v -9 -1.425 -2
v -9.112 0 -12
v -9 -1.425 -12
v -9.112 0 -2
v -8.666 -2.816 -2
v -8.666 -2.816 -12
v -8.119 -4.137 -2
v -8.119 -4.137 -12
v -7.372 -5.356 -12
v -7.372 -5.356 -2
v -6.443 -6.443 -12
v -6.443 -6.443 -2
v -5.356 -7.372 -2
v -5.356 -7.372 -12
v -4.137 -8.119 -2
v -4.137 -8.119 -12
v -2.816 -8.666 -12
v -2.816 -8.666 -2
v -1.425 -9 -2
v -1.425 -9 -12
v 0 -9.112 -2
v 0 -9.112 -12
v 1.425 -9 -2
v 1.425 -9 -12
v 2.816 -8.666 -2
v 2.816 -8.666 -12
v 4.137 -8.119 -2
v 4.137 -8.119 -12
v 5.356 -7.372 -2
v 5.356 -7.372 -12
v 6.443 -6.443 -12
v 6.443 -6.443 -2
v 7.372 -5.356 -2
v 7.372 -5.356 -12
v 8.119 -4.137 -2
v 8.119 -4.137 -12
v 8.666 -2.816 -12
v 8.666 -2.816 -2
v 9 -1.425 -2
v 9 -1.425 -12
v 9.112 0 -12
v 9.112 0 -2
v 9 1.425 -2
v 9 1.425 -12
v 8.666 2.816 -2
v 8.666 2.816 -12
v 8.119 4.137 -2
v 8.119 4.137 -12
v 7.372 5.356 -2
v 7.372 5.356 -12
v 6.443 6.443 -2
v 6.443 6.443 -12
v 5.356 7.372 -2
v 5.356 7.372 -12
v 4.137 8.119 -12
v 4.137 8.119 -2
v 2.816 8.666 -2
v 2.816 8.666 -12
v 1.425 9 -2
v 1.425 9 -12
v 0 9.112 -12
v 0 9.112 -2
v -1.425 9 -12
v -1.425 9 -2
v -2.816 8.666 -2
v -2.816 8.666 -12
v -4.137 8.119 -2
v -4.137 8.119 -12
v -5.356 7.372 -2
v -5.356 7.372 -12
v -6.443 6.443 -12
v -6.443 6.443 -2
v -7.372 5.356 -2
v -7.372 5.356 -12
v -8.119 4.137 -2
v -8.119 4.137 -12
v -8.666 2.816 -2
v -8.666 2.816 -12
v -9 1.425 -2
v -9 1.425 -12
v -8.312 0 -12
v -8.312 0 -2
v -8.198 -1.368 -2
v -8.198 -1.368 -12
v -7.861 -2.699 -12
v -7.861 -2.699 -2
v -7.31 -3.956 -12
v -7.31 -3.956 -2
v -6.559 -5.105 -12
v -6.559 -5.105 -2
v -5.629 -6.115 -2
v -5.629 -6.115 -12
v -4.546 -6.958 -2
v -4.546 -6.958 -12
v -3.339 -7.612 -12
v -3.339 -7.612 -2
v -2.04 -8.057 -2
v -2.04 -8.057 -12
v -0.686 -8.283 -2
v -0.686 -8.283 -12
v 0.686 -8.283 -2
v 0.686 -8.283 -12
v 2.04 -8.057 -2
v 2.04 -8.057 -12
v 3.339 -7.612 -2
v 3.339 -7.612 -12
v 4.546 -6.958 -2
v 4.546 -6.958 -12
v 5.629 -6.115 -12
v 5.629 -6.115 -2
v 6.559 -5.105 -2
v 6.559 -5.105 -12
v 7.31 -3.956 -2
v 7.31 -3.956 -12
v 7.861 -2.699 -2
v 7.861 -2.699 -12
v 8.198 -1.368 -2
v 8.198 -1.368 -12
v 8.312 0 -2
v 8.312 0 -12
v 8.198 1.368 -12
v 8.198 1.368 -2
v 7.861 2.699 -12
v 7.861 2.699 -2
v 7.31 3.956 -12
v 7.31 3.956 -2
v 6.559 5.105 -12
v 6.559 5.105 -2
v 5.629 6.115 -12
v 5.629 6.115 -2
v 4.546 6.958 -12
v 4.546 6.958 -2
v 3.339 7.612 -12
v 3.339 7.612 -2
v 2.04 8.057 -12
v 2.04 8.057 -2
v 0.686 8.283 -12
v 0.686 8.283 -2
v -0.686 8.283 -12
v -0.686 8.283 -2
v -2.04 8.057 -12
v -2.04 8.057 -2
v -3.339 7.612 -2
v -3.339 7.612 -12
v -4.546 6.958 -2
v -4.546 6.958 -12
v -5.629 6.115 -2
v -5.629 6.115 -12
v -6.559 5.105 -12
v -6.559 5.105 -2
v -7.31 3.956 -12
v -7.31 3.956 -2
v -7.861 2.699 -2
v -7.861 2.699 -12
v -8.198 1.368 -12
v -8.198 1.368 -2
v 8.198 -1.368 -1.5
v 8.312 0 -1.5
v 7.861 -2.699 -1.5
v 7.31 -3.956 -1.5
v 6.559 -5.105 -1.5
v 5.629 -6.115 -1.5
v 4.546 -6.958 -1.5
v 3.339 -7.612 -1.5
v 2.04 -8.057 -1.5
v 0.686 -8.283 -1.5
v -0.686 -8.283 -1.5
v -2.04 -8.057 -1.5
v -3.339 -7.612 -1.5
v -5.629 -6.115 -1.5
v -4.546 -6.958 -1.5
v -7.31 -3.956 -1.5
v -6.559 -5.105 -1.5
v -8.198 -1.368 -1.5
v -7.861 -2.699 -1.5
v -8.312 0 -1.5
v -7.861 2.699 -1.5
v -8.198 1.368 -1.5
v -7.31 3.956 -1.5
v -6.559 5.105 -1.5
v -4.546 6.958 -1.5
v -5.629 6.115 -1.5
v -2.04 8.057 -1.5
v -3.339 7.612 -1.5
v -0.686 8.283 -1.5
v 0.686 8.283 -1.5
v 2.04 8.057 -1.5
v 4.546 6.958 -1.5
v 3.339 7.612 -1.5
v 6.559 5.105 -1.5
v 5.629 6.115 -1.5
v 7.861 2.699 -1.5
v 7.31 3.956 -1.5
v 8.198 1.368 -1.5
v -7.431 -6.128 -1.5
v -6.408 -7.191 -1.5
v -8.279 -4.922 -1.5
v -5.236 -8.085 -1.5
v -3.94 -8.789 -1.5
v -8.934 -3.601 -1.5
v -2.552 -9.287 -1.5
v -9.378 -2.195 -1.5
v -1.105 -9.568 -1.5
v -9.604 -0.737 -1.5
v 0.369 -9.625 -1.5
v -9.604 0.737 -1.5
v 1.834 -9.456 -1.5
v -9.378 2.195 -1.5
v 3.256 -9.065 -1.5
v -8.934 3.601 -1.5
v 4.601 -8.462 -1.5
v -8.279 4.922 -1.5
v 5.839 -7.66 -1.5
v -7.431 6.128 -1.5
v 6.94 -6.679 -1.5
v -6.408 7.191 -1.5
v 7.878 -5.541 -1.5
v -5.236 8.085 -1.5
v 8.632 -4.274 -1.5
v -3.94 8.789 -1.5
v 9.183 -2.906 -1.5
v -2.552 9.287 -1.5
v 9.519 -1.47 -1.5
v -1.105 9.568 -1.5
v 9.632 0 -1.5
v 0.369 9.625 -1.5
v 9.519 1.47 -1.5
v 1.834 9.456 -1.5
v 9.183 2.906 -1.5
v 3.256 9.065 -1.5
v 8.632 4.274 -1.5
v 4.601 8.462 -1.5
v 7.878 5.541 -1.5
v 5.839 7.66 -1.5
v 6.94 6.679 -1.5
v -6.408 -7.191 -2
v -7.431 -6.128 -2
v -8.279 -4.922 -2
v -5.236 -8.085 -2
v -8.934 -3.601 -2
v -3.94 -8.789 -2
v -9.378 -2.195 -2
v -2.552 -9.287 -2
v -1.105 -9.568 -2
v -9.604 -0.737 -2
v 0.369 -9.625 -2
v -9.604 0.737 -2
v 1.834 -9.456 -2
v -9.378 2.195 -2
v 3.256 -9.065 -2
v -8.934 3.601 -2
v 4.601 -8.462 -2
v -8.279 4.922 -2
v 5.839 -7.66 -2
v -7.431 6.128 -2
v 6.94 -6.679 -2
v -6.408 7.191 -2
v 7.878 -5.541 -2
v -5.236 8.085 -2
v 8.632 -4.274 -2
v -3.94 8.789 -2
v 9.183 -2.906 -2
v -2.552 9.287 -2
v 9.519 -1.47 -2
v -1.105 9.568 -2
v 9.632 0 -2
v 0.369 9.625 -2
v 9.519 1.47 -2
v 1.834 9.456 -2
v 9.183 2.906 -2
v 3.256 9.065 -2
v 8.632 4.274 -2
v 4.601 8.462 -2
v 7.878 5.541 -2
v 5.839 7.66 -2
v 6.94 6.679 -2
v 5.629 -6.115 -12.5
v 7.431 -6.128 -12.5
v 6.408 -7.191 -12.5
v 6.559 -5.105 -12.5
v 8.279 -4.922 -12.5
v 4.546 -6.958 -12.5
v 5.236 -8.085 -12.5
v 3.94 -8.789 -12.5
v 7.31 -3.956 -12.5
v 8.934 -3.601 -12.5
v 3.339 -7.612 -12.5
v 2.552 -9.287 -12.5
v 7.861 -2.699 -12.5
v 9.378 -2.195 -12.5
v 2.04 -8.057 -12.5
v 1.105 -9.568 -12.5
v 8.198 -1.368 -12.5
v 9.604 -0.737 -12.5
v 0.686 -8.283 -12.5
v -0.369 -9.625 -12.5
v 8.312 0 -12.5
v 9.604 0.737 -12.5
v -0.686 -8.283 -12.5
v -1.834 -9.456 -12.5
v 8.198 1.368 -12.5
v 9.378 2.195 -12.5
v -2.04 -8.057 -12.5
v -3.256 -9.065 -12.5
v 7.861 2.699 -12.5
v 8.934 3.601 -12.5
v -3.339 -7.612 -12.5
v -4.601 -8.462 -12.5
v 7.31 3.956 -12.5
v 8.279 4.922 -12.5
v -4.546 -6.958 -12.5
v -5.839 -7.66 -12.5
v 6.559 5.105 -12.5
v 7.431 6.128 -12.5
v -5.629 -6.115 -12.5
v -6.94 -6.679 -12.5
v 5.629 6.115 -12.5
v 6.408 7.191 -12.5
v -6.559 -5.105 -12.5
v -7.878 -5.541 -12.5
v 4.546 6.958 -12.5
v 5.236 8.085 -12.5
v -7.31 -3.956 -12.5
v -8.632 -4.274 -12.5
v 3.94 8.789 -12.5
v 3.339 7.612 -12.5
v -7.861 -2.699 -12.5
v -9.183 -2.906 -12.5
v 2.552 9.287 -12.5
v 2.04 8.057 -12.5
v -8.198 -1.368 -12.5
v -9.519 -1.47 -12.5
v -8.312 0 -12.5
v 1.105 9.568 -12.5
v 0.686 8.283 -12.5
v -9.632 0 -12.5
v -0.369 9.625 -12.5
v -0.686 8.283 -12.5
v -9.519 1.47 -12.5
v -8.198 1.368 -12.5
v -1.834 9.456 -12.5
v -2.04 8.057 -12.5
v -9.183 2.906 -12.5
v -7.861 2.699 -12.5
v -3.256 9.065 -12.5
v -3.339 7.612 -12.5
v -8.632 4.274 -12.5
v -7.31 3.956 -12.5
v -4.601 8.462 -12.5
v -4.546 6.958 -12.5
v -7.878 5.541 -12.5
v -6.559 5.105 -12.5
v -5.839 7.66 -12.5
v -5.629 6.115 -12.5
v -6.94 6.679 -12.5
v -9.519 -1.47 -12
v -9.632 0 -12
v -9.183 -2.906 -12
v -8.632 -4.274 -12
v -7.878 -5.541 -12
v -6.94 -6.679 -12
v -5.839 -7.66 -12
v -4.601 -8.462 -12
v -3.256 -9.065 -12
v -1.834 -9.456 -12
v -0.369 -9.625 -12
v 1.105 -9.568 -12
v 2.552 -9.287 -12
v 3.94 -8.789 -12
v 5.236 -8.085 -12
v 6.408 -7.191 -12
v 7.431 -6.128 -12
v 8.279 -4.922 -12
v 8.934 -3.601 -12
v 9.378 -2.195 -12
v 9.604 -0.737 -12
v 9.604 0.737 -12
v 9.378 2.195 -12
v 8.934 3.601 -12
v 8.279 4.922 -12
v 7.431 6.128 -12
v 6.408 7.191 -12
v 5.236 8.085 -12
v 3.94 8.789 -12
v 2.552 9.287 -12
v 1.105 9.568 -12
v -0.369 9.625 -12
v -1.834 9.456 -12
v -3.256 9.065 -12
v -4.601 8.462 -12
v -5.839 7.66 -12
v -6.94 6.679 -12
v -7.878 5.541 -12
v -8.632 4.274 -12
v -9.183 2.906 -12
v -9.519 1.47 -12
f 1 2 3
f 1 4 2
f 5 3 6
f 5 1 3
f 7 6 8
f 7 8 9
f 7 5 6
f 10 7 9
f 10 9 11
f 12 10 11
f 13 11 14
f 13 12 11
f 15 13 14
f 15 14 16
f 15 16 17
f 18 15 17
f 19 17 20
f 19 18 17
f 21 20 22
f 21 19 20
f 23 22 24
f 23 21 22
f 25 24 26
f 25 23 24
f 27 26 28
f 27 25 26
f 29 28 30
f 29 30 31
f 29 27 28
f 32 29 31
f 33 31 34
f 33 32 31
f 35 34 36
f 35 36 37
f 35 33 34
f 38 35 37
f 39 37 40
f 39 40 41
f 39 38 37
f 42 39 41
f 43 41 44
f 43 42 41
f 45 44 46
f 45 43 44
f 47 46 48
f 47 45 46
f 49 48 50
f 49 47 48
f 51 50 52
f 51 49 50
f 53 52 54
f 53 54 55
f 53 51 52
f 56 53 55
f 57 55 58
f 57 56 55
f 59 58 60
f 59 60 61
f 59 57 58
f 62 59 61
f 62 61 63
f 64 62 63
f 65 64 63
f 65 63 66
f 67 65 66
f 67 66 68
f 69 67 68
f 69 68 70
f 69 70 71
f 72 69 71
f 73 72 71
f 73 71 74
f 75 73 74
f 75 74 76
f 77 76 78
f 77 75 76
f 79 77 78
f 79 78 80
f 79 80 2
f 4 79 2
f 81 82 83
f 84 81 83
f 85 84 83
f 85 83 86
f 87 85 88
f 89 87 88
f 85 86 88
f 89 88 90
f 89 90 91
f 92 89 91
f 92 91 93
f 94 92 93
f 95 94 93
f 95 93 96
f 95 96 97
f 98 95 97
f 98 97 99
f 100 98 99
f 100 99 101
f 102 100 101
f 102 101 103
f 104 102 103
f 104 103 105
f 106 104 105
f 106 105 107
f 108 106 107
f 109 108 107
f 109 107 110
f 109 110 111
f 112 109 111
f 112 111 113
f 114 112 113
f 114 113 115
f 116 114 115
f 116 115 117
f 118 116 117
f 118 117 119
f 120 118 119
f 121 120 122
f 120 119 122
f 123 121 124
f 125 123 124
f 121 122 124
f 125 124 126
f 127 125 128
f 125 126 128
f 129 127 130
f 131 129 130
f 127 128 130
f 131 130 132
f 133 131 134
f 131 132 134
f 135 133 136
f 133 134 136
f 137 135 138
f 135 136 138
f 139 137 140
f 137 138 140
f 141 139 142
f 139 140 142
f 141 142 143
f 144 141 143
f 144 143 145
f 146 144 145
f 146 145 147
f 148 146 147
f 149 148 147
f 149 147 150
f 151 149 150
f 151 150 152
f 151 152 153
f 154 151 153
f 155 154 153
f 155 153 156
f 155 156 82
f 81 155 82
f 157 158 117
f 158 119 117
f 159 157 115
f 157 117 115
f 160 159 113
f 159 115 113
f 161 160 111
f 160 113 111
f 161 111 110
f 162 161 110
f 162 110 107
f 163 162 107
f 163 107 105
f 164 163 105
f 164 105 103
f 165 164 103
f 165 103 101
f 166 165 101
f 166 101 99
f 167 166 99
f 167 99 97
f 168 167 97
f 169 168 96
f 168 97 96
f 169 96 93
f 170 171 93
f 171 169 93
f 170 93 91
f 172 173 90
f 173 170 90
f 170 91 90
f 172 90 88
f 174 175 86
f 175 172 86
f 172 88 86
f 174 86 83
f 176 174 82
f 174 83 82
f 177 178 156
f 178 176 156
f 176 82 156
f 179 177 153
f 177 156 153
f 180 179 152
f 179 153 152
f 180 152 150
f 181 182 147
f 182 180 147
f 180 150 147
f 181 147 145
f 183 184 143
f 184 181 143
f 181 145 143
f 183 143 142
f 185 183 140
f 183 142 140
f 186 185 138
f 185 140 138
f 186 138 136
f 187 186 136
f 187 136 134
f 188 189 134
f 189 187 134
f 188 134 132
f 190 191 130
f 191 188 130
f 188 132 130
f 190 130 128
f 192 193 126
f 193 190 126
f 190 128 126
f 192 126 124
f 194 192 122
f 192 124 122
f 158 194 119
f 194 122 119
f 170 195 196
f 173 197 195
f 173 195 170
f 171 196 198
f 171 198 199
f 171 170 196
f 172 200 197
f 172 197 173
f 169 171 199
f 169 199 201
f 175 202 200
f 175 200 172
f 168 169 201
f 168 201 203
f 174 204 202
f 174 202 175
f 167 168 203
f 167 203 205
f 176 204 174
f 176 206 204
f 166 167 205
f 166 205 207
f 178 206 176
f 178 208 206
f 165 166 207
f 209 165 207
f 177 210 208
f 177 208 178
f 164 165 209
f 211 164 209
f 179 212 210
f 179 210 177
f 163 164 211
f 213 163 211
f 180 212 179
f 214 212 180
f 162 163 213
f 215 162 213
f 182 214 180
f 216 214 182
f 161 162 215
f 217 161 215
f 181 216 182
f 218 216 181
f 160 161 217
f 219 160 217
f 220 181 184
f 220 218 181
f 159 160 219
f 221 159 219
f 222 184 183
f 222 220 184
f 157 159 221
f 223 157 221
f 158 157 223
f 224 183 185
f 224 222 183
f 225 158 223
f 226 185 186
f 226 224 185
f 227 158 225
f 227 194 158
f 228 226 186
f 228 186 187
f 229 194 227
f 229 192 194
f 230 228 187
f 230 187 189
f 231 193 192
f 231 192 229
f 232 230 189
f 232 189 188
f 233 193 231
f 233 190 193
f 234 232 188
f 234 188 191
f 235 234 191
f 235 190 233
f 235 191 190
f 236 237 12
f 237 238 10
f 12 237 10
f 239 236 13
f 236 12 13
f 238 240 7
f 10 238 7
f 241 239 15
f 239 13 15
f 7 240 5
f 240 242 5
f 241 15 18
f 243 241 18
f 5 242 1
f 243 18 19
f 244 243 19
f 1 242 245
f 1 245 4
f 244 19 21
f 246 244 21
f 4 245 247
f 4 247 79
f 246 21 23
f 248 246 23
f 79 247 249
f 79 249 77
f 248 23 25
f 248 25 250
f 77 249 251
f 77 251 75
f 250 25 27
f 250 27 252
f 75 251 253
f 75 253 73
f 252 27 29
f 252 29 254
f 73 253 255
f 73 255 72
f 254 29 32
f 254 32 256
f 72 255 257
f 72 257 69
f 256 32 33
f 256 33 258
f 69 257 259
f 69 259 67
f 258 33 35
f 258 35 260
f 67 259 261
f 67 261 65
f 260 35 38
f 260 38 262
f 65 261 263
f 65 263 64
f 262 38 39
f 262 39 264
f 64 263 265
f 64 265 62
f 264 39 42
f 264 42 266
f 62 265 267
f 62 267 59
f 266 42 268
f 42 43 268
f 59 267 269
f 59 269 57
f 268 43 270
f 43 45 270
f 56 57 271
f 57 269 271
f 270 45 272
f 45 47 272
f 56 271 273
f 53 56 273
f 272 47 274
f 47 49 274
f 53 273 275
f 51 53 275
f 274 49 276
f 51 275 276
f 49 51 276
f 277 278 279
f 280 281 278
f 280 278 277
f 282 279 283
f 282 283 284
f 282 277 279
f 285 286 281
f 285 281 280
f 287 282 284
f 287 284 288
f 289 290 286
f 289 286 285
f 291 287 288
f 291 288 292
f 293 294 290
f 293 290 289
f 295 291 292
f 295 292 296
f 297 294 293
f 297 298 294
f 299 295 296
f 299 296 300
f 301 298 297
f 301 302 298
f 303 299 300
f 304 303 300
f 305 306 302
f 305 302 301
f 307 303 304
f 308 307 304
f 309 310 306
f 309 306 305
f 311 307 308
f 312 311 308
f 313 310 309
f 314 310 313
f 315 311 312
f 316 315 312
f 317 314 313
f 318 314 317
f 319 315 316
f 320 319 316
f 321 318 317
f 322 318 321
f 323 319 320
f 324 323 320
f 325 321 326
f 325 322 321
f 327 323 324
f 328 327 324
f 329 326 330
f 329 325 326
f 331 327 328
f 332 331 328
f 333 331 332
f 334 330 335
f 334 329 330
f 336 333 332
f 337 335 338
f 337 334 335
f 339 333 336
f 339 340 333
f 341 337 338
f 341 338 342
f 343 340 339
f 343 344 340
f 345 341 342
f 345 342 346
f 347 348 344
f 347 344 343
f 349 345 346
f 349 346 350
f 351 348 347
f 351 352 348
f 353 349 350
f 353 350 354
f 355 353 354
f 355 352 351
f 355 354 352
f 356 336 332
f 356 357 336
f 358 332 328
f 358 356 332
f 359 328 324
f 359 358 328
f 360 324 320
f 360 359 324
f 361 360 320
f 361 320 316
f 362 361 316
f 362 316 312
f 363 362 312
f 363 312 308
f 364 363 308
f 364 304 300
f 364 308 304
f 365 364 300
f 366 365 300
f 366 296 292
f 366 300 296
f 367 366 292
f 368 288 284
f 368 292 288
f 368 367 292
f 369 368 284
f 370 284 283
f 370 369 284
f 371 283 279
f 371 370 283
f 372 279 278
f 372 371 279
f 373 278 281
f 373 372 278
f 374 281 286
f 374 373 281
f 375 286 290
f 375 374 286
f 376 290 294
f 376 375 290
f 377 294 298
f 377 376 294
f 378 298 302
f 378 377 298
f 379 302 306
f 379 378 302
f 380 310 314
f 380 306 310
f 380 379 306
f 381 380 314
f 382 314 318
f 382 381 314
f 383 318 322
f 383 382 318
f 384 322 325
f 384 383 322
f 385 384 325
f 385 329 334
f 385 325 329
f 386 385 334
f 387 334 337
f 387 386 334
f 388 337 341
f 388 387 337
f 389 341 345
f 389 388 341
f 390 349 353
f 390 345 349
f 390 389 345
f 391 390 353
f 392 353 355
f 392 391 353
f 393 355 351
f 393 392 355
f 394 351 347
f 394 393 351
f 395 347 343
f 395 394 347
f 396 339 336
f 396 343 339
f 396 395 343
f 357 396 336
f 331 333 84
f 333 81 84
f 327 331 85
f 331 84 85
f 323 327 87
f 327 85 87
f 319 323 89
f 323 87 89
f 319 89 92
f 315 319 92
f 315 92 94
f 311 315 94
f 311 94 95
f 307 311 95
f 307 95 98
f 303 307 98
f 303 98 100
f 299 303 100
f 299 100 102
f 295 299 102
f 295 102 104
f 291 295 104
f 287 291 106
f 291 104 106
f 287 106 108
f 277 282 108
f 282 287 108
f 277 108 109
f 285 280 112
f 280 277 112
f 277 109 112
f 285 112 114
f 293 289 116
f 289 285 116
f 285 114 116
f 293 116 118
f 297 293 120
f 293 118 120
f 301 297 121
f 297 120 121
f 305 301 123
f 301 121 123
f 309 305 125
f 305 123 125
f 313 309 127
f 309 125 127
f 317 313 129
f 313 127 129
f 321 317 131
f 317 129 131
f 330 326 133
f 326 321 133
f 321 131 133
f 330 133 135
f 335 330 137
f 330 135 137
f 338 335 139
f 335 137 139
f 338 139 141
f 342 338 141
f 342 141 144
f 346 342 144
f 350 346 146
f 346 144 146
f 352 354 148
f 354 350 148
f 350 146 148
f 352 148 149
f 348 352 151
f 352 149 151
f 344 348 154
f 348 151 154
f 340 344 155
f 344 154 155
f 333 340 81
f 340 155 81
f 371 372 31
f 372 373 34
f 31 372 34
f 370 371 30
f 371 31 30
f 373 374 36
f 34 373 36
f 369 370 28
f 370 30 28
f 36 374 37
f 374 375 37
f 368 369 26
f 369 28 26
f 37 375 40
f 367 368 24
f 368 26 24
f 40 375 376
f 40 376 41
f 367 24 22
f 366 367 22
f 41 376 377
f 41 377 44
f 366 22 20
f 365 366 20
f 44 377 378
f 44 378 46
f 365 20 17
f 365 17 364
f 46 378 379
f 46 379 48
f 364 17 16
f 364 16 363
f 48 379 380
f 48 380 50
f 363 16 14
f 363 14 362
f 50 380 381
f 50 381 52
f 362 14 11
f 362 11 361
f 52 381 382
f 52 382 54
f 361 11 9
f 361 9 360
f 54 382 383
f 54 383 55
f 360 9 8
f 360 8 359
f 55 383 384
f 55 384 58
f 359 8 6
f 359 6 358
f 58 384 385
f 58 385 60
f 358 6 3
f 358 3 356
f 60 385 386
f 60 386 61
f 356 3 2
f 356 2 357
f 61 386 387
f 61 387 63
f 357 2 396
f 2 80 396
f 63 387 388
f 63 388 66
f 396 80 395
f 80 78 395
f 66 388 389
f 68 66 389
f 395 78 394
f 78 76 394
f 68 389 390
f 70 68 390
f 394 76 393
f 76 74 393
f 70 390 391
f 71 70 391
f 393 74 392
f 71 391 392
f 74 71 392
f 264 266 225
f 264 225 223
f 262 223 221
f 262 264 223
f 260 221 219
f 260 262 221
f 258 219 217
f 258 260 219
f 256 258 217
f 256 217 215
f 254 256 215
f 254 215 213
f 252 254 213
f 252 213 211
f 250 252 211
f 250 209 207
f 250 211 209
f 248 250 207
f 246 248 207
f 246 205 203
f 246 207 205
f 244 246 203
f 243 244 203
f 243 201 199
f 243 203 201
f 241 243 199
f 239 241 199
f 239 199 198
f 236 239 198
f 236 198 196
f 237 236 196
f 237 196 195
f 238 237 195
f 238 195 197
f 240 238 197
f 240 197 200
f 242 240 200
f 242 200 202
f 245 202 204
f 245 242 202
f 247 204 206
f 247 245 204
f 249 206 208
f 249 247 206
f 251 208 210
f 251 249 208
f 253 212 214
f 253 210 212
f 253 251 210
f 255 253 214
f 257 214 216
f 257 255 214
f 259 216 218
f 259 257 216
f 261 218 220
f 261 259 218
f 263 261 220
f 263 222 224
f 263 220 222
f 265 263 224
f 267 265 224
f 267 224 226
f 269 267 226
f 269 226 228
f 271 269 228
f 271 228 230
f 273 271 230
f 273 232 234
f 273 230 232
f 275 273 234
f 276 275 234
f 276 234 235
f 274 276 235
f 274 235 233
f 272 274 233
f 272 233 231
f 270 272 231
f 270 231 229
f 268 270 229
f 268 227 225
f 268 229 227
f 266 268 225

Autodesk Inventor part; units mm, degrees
ref_plane "YZ Plane" through (0, 0, 0) normal (1, 0, 0) x (0, 1, 0)
ref_plane "XZ Plane" through (0, 0, 0) normal (0, 1, 0) x (-1, 0, 0)
ref_plane "XY Plane" through (0, 0, 0) normal (0, 0, 1) x (1, 0, 0)
ref_plane "Work Plane1" through (0, 0, -2) normal (0, 0, 1) x (-1, 0, 0)
sketch "Sketch1" plane through (0, 0, -2) normal (0, 0, 1) x (-1, 0, 0)
  circle A0 centre (0, 0) radius 8.1117 projected
  circle A1 centre (0, 0) radius 8.3117
  circle A2 centre (0, 0) radius 9.1117
  point P0 (0, 0)
  dimension "d0" = 0.2
  dimension "d1" = 1
extrude "Extrusion1" add sketch "Sketch1" against normal blind 10 contours A2
sketch "Sketch2" plane through (0, 0, -2) normal (0, 0, 1) x (1, 0, 0)
  circle A0 centre (0, 0) radius 8.3117 projected
  circle A1 centre (0, 0) radius 9.6318
  point P0 (0, 0)
extrude "Extrusion2" add sketch "Sketch2" along normal blind 0.5
sketch "Sketch3" plane through (0, 0, -12) normal (0, 0, -1) x (-1, 0, 0)
  circle A0 centre (0, 0) radius 9.6318 projected
  circle A1 centre (0, 0) radius 8.3117 projected
  point P0 (0, 0)
extrude "Extrusion3" add sketch "Sketch3" along normal blind 0.5
properties part number "01_Autofocus_10x_objective_copper_coil"
